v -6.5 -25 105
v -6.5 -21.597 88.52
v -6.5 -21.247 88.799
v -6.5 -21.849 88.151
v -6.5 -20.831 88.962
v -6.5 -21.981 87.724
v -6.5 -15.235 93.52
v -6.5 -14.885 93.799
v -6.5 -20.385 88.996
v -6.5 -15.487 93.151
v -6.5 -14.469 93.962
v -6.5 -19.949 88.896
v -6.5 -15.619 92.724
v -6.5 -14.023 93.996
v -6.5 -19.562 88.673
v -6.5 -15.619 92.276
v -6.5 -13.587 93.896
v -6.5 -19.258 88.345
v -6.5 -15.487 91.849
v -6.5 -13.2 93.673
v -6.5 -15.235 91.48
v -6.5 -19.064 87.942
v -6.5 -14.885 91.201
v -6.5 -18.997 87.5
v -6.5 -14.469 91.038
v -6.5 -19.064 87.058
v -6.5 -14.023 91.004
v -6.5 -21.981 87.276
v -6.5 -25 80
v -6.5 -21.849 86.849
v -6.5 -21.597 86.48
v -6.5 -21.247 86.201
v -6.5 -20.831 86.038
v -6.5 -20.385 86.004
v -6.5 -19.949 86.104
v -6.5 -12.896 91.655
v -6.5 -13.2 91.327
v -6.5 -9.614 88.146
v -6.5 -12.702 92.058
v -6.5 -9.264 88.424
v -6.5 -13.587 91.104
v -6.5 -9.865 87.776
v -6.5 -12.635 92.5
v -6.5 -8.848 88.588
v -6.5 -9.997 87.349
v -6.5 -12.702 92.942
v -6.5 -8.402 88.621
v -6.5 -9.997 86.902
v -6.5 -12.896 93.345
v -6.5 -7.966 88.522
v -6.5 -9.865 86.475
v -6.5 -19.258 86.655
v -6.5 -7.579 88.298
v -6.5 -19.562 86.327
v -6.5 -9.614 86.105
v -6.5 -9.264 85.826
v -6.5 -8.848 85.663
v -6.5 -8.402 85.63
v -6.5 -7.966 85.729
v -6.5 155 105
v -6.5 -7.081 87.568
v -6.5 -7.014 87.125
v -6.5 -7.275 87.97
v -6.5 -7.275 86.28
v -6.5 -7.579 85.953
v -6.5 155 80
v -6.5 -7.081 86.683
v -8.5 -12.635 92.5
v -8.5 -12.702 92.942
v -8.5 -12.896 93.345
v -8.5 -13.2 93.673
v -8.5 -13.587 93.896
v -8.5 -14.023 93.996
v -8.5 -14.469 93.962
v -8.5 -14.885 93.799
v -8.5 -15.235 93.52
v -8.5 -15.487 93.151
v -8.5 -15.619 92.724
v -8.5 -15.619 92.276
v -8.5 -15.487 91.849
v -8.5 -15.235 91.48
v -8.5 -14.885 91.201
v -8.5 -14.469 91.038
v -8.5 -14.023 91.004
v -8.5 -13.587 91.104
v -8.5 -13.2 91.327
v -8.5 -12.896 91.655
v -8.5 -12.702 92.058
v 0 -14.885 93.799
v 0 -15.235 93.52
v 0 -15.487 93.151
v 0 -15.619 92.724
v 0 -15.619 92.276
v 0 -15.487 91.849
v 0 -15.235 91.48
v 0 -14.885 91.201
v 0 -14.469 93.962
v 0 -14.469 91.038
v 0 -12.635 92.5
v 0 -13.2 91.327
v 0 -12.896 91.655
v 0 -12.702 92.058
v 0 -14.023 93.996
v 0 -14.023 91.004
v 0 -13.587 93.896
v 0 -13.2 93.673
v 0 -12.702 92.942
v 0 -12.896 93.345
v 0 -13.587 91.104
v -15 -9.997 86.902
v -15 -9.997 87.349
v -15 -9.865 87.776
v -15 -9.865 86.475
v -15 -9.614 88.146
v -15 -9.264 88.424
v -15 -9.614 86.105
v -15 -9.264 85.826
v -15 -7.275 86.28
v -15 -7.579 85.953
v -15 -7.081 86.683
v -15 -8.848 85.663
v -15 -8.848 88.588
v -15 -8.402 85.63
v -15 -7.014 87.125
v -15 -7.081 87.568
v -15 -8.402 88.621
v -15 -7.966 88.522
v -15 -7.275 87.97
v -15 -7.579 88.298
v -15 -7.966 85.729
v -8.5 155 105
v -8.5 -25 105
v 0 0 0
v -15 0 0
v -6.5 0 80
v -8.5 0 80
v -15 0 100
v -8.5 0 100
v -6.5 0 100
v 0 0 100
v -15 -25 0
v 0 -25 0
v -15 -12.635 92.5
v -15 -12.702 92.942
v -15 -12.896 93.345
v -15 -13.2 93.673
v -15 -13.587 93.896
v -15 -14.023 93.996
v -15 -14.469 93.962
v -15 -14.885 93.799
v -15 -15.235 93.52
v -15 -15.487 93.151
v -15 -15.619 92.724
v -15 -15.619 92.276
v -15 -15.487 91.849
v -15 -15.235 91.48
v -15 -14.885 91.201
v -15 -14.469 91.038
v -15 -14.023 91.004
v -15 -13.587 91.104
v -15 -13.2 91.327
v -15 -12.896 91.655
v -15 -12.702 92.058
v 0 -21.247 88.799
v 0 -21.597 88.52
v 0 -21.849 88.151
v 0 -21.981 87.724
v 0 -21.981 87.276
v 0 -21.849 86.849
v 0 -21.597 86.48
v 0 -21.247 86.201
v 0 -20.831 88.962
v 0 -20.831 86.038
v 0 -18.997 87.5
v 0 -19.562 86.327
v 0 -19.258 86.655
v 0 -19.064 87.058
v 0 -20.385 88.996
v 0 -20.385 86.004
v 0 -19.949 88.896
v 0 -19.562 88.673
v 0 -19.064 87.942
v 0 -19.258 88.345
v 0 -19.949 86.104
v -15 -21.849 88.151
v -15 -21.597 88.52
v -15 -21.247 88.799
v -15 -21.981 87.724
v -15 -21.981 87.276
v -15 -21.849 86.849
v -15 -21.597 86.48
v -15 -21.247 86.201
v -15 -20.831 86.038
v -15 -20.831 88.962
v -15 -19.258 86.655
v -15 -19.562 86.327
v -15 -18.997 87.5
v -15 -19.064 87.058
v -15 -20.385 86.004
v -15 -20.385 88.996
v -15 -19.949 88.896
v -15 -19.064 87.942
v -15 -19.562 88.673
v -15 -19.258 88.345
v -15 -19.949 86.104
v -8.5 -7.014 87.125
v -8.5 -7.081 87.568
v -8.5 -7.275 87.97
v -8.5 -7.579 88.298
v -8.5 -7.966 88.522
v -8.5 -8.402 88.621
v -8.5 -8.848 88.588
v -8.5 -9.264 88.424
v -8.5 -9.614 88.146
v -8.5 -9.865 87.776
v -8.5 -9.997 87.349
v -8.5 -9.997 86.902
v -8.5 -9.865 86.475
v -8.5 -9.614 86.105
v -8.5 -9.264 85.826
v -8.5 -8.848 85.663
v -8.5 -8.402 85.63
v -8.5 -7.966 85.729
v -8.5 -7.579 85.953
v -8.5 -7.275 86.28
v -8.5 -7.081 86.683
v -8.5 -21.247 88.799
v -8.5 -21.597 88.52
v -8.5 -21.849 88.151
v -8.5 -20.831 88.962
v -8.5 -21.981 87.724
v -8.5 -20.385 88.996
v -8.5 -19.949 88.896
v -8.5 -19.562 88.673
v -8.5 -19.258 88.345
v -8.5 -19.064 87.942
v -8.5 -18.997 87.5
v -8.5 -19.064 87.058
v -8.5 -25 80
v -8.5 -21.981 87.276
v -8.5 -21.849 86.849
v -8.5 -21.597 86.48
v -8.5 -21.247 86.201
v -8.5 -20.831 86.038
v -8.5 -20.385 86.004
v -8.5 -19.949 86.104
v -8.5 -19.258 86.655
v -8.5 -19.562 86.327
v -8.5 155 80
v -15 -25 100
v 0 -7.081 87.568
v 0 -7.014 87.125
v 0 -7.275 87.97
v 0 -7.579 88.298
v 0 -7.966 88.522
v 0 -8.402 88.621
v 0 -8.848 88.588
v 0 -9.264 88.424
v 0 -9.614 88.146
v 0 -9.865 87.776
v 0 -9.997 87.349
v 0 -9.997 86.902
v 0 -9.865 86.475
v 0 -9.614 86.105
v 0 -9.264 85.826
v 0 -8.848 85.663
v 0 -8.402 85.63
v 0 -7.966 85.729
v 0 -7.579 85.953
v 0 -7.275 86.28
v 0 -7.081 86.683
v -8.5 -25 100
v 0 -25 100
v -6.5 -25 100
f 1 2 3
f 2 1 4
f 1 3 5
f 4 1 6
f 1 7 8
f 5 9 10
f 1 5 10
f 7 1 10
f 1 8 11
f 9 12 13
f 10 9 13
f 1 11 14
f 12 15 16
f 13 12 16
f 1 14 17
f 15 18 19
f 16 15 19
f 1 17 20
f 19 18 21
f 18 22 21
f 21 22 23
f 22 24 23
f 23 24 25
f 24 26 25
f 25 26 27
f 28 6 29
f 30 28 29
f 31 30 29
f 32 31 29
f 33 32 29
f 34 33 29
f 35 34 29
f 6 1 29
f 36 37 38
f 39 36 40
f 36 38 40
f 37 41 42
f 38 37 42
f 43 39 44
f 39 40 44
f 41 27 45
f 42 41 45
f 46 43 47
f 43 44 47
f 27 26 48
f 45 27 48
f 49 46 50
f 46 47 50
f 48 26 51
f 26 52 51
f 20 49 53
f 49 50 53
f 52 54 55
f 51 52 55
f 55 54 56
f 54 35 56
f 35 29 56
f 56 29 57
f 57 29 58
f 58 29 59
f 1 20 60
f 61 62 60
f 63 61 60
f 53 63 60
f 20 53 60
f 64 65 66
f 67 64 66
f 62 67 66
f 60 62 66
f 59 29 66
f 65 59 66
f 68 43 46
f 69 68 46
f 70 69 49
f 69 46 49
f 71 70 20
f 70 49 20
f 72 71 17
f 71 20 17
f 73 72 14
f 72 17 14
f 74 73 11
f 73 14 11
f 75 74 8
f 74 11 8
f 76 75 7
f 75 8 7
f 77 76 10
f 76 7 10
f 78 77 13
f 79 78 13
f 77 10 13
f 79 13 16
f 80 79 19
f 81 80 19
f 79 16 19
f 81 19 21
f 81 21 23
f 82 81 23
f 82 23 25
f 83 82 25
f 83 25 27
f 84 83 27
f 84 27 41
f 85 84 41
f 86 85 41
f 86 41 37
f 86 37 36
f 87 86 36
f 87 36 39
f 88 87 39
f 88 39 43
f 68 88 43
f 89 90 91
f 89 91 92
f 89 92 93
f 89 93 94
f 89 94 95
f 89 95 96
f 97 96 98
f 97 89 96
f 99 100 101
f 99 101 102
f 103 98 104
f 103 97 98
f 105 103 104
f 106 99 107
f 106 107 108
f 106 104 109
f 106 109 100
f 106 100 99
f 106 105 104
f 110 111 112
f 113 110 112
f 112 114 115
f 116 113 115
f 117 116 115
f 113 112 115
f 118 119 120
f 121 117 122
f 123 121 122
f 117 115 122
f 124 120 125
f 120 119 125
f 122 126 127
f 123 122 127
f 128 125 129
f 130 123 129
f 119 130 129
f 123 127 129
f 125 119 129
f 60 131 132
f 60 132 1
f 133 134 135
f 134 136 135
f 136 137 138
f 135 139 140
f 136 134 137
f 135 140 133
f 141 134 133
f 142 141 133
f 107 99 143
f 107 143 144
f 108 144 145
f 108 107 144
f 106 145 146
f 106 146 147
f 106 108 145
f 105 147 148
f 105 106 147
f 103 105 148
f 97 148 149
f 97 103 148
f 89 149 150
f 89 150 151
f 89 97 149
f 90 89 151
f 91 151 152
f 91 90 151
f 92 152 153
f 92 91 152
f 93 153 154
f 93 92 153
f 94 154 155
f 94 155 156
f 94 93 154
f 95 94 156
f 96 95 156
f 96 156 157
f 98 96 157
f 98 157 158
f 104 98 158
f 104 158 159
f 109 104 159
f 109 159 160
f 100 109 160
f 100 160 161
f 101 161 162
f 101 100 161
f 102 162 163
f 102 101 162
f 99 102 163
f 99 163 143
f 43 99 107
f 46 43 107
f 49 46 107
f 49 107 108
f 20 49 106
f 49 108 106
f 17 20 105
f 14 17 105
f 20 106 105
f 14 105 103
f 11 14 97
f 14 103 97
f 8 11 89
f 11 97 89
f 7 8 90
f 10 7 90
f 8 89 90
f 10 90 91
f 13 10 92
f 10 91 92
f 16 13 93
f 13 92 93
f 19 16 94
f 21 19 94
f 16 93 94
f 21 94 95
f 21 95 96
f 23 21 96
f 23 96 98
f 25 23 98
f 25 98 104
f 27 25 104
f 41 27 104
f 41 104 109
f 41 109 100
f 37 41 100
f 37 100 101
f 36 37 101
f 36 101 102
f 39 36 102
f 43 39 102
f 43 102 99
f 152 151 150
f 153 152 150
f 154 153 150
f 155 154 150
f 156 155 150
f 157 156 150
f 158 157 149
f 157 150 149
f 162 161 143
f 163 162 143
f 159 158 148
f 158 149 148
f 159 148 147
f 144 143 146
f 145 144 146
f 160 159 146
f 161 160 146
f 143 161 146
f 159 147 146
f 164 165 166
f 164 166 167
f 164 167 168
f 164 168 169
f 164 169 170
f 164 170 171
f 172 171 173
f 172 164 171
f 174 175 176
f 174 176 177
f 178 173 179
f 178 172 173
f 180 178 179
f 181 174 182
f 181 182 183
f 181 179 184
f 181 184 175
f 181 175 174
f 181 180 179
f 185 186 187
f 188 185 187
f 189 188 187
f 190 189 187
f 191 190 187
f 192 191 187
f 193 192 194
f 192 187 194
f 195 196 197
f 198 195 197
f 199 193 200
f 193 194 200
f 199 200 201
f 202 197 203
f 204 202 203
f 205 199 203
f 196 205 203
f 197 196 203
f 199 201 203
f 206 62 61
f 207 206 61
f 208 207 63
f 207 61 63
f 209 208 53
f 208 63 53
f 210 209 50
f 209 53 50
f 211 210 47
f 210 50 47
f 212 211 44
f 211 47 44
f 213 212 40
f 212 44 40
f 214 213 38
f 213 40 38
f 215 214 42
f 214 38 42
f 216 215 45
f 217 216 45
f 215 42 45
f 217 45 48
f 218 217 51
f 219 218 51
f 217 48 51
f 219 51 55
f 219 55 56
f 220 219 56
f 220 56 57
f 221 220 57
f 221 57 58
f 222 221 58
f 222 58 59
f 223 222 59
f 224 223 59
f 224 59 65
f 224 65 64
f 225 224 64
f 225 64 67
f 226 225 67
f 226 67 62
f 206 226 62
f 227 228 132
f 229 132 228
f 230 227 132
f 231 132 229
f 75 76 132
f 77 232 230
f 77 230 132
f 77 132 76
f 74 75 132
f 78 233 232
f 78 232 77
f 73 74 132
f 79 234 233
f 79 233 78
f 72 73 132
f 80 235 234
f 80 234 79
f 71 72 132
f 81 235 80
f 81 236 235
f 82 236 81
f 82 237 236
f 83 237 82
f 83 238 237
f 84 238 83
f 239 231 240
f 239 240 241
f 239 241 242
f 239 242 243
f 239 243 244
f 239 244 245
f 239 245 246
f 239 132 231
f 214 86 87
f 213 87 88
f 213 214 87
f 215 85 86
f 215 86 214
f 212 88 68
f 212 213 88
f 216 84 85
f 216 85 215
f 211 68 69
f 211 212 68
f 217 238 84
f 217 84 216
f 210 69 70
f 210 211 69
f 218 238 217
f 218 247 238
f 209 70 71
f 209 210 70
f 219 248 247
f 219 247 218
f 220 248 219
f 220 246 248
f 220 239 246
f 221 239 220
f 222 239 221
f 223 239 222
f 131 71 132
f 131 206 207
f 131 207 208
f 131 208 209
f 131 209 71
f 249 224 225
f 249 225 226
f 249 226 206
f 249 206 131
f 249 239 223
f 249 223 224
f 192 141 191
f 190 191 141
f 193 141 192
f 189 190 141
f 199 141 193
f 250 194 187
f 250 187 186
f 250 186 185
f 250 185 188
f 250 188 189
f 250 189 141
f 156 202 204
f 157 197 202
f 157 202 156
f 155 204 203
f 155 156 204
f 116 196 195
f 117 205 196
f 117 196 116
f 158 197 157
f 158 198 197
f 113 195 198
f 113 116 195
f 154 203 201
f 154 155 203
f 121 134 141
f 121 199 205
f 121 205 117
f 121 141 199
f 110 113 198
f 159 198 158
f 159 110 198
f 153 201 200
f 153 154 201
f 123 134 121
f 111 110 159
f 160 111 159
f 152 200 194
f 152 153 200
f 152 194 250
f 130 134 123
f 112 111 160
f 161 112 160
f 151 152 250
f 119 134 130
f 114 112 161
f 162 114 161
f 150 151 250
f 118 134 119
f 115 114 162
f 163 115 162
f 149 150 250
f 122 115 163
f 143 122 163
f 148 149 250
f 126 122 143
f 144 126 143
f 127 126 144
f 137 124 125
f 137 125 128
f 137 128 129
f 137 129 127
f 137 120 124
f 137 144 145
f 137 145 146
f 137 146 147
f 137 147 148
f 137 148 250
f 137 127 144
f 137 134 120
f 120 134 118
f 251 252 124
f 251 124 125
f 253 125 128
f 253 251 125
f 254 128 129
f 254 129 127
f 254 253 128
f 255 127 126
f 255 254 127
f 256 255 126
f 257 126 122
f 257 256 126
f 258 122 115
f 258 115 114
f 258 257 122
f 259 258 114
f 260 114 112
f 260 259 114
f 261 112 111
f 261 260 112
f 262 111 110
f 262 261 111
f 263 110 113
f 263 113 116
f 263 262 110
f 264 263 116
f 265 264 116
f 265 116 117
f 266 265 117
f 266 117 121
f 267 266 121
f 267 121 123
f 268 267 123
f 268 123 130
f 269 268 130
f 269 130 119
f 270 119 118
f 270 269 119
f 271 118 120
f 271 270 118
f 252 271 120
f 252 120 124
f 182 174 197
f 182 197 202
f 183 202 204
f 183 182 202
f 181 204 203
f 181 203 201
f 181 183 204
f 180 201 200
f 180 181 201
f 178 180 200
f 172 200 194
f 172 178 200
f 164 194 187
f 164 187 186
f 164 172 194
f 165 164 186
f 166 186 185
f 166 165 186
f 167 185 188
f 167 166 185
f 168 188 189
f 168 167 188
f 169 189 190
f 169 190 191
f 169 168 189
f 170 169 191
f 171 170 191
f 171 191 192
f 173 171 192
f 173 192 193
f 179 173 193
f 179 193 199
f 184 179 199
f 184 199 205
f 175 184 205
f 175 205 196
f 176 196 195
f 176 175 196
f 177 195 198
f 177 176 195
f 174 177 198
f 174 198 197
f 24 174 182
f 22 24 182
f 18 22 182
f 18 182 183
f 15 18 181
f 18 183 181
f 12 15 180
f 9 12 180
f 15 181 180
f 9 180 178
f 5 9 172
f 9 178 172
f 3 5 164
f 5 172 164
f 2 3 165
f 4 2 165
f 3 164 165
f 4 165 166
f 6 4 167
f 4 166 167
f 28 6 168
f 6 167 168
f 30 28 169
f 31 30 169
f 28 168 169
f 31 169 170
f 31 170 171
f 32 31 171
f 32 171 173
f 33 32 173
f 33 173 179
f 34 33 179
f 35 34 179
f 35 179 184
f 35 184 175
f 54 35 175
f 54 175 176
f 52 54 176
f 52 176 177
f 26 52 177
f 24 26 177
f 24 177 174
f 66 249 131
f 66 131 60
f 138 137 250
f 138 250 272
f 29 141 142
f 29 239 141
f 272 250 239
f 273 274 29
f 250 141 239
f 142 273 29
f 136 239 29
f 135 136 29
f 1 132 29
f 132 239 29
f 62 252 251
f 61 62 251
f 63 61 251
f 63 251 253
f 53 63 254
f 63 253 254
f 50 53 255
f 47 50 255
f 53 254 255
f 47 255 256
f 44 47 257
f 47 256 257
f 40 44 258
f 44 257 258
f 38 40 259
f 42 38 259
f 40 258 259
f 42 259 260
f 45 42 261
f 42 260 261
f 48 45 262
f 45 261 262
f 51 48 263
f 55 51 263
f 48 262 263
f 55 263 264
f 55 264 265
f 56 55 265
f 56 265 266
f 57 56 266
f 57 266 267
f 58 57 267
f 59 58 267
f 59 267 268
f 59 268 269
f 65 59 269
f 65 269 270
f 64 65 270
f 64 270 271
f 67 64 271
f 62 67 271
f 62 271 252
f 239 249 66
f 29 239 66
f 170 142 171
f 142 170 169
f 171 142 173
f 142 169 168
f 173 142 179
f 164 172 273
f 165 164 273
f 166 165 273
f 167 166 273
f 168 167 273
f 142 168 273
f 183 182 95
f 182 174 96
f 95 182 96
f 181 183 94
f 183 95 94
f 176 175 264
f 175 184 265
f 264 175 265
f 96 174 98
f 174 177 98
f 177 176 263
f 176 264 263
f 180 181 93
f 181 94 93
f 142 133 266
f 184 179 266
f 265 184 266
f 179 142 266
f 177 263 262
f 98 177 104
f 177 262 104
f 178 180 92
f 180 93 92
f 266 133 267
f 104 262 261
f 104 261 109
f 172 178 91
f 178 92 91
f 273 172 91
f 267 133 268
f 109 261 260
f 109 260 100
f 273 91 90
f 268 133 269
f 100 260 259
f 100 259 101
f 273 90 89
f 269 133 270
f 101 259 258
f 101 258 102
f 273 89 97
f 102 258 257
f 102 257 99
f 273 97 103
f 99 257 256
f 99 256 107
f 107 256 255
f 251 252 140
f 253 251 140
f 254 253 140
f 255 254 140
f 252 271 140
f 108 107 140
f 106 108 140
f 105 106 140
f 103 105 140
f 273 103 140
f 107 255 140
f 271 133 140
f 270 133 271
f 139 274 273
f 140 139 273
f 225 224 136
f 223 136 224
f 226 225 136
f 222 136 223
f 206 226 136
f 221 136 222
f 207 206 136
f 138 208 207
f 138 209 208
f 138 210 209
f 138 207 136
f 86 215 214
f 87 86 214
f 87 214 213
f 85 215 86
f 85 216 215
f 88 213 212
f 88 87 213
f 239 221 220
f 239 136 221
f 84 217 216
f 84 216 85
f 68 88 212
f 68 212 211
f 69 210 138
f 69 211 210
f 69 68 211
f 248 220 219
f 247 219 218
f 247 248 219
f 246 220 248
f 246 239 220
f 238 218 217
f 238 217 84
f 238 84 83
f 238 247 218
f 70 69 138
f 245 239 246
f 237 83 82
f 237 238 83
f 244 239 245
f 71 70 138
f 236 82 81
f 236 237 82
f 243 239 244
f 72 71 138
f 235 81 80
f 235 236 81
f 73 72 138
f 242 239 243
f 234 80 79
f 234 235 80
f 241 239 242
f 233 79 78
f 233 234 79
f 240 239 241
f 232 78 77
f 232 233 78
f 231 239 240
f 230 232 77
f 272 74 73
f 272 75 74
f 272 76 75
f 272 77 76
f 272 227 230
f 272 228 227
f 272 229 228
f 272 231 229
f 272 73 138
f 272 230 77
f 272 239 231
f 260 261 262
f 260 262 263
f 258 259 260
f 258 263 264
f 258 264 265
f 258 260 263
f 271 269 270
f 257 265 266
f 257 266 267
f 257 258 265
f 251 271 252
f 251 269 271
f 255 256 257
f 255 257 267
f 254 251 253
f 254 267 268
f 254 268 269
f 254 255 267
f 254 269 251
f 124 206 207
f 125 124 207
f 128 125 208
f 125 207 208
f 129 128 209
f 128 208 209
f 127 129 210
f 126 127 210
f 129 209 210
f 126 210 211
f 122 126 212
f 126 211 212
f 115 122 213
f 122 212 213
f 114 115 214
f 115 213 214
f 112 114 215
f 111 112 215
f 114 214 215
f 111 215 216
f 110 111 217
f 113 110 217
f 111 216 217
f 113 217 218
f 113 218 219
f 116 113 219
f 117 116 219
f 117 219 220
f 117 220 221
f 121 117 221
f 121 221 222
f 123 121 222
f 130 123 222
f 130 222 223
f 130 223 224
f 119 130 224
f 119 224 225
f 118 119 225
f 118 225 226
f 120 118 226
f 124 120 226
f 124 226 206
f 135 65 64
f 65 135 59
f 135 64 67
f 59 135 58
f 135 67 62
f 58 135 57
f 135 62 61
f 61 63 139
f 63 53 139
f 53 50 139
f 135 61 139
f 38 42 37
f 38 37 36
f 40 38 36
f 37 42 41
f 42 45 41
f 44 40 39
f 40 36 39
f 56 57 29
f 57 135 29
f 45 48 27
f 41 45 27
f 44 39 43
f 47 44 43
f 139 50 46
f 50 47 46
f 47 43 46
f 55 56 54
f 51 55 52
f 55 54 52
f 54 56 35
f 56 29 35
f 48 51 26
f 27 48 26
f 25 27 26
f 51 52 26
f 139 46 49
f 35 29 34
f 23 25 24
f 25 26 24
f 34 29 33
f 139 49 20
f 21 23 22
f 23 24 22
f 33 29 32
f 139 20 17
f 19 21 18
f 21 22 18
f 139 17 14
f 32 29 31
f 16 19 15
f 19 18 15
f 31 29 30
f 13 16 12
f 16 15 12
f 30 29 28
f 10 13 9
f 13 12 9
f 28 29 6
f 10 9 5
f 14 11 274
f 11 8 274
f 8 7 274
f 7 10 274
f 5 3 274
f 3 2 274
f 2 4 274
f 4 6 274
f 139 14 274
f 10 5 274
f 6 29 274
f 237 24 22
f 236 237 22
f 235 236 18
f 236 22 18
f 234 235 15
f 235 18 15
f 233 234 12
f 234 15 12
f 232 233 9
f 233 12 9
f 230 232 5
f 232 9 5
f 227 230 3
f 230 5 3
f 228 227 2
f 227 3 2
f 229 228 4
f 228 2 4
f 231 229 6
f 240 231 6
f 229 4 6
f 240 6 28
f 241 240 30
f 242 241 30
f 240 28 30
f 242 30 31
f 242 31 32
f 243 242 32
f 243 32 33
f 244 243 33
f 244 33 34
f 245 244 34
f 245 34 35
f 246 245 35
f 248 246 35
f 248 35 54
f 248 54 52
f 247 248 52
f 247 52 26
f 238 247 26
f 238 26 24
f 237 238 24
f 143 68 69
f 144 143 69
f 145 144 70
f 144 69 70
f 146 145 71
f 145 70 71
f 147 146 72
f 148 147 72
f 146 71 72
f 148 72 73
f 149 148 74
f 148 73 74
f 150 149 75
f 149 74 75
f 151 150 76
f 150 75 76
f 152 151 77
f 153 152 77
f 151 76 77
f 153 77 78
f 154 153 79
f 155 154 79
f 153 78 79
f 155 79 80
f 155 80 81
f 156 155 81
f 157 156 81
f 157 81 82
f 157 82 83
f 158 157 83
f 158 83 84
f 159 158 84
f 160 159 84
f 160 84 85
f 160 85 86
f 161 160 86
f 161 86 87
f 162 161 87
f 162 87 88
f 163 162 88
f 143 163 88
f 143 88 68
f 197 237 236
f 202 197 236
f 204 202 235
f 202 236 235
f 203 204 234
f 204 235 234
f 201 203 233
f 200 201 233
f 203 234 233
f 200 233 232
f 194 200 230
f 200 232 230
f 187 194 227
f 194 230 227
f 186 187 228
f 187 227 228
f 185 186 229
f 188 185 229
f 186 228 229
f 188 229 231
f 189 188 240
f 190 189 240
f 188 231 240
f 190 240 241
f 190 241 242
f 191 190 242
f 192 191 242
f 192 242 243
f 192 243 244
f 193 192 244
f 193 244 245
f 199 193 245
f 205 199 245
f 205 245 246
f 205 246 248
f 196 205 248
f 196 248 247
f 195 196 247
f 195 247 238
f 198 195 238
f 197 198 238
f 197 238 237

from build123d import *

# Parameters (mm, degrees)
F0_W      = 15
F0_H      = 100
F1_DEPTH  = 25
F2_W      = 2
F2_H      = 20
F3_DEPTH  = 25
F4_DEPTH  = 180
F5_DEPTH  = 5
F7_R      = 1.5
F8_DEPTH  = 15
F9_R      = 1.5
F10_DEPTH = 15


with BuildPart() as f1:
    # F0 (on Front) → F1 (new body)
    with BuildSketch(Plane.XZ):
        with Locations((-7.5, 50)):
            Rectangle(F0_W, F0_H)
    extrude(amount=F1_DEPTH)

    # F2 (on face) → F3 (cut)
    with BuildSketch(Plane.XZ.offset(25)):
        with Locations((-7.5, 90)):
            Rectangle(F2_W, F2_H)
    extrude(amount=-F3_DEPTH, mode=Mode.SUBTRACT)


with BuildPart() as f4:
    # F2 (on face) → F4 (new body)
    with BuildSketch(Plane.XZ.offset(25)):
        with Locations((-7.5, 90)):
            Rectangle(F2_W, F2_H)
    extrude(amount=-F4_DEPTH)

    # F5 (add): a face of the model
    f5_faces = [f4.faces().sort_by_distance(p)[0] for p in [
        (-7.5, 65, 100),
    ]]
    extrude(f5_faces, amount=F5_DEPTH)


with BuildPart() as f8_tool:
    # F7 (on face) → F8 (new body)
    with BuildSketch(Plane.YZ):
        with Locations((-14.1354007646, 92.5)):
            Circle(F7_R)
        with Locations((-20.4972922802, 87.5)):
            Circle(F7_R)
        with Locations((-8.5139255971, 87.1254205704)):
            Circle(F7_R)
    extrude(amount=-F8_DEPTH)


with BuildPart() as f1_1:
    add(f1.part)

    # F8: cut by f8_tool
    add(f8_tool.part, mode=Mode.SUBTRACT)


with BuildPart() as f4_1:
    add(f4.part)

    # F8: cut by f8_tool
    add(f8_tool.part, mode=Mode.SUBTRACT)


with BuildPart() as f10:
    # F9 (on face) → F10 (new body)
    with BuildSketch(Plane.YZ):
        with Locations((-14.1354007646, 92.5)):
            Circle(F9_R)
    extrude(amount=-F10_DEPTH)


with BuildPart() as f10b:
    # F9 (on face) → F10, piece 2 (new body)
    with BuildSketch(Plane.YZ):
        with Locations((-20.4972922802, 87.5)):
            Circle(F9_R)
    extrude(amount=-F10_DEPTH)


with BuildPart() as f10c:
    # F9 (on face) → F10, piece 3 (new body)
    with BuildSketch(Plane.YZ):
        with Locations((-8.5139255971, 87.1254205704)):
            Circle(F9_R)
    extrude(amount=-F10_DEPTH)


solid = Compound([f1_1.part, f4_1.part, f10.part, f10b.part, f10c.part])
